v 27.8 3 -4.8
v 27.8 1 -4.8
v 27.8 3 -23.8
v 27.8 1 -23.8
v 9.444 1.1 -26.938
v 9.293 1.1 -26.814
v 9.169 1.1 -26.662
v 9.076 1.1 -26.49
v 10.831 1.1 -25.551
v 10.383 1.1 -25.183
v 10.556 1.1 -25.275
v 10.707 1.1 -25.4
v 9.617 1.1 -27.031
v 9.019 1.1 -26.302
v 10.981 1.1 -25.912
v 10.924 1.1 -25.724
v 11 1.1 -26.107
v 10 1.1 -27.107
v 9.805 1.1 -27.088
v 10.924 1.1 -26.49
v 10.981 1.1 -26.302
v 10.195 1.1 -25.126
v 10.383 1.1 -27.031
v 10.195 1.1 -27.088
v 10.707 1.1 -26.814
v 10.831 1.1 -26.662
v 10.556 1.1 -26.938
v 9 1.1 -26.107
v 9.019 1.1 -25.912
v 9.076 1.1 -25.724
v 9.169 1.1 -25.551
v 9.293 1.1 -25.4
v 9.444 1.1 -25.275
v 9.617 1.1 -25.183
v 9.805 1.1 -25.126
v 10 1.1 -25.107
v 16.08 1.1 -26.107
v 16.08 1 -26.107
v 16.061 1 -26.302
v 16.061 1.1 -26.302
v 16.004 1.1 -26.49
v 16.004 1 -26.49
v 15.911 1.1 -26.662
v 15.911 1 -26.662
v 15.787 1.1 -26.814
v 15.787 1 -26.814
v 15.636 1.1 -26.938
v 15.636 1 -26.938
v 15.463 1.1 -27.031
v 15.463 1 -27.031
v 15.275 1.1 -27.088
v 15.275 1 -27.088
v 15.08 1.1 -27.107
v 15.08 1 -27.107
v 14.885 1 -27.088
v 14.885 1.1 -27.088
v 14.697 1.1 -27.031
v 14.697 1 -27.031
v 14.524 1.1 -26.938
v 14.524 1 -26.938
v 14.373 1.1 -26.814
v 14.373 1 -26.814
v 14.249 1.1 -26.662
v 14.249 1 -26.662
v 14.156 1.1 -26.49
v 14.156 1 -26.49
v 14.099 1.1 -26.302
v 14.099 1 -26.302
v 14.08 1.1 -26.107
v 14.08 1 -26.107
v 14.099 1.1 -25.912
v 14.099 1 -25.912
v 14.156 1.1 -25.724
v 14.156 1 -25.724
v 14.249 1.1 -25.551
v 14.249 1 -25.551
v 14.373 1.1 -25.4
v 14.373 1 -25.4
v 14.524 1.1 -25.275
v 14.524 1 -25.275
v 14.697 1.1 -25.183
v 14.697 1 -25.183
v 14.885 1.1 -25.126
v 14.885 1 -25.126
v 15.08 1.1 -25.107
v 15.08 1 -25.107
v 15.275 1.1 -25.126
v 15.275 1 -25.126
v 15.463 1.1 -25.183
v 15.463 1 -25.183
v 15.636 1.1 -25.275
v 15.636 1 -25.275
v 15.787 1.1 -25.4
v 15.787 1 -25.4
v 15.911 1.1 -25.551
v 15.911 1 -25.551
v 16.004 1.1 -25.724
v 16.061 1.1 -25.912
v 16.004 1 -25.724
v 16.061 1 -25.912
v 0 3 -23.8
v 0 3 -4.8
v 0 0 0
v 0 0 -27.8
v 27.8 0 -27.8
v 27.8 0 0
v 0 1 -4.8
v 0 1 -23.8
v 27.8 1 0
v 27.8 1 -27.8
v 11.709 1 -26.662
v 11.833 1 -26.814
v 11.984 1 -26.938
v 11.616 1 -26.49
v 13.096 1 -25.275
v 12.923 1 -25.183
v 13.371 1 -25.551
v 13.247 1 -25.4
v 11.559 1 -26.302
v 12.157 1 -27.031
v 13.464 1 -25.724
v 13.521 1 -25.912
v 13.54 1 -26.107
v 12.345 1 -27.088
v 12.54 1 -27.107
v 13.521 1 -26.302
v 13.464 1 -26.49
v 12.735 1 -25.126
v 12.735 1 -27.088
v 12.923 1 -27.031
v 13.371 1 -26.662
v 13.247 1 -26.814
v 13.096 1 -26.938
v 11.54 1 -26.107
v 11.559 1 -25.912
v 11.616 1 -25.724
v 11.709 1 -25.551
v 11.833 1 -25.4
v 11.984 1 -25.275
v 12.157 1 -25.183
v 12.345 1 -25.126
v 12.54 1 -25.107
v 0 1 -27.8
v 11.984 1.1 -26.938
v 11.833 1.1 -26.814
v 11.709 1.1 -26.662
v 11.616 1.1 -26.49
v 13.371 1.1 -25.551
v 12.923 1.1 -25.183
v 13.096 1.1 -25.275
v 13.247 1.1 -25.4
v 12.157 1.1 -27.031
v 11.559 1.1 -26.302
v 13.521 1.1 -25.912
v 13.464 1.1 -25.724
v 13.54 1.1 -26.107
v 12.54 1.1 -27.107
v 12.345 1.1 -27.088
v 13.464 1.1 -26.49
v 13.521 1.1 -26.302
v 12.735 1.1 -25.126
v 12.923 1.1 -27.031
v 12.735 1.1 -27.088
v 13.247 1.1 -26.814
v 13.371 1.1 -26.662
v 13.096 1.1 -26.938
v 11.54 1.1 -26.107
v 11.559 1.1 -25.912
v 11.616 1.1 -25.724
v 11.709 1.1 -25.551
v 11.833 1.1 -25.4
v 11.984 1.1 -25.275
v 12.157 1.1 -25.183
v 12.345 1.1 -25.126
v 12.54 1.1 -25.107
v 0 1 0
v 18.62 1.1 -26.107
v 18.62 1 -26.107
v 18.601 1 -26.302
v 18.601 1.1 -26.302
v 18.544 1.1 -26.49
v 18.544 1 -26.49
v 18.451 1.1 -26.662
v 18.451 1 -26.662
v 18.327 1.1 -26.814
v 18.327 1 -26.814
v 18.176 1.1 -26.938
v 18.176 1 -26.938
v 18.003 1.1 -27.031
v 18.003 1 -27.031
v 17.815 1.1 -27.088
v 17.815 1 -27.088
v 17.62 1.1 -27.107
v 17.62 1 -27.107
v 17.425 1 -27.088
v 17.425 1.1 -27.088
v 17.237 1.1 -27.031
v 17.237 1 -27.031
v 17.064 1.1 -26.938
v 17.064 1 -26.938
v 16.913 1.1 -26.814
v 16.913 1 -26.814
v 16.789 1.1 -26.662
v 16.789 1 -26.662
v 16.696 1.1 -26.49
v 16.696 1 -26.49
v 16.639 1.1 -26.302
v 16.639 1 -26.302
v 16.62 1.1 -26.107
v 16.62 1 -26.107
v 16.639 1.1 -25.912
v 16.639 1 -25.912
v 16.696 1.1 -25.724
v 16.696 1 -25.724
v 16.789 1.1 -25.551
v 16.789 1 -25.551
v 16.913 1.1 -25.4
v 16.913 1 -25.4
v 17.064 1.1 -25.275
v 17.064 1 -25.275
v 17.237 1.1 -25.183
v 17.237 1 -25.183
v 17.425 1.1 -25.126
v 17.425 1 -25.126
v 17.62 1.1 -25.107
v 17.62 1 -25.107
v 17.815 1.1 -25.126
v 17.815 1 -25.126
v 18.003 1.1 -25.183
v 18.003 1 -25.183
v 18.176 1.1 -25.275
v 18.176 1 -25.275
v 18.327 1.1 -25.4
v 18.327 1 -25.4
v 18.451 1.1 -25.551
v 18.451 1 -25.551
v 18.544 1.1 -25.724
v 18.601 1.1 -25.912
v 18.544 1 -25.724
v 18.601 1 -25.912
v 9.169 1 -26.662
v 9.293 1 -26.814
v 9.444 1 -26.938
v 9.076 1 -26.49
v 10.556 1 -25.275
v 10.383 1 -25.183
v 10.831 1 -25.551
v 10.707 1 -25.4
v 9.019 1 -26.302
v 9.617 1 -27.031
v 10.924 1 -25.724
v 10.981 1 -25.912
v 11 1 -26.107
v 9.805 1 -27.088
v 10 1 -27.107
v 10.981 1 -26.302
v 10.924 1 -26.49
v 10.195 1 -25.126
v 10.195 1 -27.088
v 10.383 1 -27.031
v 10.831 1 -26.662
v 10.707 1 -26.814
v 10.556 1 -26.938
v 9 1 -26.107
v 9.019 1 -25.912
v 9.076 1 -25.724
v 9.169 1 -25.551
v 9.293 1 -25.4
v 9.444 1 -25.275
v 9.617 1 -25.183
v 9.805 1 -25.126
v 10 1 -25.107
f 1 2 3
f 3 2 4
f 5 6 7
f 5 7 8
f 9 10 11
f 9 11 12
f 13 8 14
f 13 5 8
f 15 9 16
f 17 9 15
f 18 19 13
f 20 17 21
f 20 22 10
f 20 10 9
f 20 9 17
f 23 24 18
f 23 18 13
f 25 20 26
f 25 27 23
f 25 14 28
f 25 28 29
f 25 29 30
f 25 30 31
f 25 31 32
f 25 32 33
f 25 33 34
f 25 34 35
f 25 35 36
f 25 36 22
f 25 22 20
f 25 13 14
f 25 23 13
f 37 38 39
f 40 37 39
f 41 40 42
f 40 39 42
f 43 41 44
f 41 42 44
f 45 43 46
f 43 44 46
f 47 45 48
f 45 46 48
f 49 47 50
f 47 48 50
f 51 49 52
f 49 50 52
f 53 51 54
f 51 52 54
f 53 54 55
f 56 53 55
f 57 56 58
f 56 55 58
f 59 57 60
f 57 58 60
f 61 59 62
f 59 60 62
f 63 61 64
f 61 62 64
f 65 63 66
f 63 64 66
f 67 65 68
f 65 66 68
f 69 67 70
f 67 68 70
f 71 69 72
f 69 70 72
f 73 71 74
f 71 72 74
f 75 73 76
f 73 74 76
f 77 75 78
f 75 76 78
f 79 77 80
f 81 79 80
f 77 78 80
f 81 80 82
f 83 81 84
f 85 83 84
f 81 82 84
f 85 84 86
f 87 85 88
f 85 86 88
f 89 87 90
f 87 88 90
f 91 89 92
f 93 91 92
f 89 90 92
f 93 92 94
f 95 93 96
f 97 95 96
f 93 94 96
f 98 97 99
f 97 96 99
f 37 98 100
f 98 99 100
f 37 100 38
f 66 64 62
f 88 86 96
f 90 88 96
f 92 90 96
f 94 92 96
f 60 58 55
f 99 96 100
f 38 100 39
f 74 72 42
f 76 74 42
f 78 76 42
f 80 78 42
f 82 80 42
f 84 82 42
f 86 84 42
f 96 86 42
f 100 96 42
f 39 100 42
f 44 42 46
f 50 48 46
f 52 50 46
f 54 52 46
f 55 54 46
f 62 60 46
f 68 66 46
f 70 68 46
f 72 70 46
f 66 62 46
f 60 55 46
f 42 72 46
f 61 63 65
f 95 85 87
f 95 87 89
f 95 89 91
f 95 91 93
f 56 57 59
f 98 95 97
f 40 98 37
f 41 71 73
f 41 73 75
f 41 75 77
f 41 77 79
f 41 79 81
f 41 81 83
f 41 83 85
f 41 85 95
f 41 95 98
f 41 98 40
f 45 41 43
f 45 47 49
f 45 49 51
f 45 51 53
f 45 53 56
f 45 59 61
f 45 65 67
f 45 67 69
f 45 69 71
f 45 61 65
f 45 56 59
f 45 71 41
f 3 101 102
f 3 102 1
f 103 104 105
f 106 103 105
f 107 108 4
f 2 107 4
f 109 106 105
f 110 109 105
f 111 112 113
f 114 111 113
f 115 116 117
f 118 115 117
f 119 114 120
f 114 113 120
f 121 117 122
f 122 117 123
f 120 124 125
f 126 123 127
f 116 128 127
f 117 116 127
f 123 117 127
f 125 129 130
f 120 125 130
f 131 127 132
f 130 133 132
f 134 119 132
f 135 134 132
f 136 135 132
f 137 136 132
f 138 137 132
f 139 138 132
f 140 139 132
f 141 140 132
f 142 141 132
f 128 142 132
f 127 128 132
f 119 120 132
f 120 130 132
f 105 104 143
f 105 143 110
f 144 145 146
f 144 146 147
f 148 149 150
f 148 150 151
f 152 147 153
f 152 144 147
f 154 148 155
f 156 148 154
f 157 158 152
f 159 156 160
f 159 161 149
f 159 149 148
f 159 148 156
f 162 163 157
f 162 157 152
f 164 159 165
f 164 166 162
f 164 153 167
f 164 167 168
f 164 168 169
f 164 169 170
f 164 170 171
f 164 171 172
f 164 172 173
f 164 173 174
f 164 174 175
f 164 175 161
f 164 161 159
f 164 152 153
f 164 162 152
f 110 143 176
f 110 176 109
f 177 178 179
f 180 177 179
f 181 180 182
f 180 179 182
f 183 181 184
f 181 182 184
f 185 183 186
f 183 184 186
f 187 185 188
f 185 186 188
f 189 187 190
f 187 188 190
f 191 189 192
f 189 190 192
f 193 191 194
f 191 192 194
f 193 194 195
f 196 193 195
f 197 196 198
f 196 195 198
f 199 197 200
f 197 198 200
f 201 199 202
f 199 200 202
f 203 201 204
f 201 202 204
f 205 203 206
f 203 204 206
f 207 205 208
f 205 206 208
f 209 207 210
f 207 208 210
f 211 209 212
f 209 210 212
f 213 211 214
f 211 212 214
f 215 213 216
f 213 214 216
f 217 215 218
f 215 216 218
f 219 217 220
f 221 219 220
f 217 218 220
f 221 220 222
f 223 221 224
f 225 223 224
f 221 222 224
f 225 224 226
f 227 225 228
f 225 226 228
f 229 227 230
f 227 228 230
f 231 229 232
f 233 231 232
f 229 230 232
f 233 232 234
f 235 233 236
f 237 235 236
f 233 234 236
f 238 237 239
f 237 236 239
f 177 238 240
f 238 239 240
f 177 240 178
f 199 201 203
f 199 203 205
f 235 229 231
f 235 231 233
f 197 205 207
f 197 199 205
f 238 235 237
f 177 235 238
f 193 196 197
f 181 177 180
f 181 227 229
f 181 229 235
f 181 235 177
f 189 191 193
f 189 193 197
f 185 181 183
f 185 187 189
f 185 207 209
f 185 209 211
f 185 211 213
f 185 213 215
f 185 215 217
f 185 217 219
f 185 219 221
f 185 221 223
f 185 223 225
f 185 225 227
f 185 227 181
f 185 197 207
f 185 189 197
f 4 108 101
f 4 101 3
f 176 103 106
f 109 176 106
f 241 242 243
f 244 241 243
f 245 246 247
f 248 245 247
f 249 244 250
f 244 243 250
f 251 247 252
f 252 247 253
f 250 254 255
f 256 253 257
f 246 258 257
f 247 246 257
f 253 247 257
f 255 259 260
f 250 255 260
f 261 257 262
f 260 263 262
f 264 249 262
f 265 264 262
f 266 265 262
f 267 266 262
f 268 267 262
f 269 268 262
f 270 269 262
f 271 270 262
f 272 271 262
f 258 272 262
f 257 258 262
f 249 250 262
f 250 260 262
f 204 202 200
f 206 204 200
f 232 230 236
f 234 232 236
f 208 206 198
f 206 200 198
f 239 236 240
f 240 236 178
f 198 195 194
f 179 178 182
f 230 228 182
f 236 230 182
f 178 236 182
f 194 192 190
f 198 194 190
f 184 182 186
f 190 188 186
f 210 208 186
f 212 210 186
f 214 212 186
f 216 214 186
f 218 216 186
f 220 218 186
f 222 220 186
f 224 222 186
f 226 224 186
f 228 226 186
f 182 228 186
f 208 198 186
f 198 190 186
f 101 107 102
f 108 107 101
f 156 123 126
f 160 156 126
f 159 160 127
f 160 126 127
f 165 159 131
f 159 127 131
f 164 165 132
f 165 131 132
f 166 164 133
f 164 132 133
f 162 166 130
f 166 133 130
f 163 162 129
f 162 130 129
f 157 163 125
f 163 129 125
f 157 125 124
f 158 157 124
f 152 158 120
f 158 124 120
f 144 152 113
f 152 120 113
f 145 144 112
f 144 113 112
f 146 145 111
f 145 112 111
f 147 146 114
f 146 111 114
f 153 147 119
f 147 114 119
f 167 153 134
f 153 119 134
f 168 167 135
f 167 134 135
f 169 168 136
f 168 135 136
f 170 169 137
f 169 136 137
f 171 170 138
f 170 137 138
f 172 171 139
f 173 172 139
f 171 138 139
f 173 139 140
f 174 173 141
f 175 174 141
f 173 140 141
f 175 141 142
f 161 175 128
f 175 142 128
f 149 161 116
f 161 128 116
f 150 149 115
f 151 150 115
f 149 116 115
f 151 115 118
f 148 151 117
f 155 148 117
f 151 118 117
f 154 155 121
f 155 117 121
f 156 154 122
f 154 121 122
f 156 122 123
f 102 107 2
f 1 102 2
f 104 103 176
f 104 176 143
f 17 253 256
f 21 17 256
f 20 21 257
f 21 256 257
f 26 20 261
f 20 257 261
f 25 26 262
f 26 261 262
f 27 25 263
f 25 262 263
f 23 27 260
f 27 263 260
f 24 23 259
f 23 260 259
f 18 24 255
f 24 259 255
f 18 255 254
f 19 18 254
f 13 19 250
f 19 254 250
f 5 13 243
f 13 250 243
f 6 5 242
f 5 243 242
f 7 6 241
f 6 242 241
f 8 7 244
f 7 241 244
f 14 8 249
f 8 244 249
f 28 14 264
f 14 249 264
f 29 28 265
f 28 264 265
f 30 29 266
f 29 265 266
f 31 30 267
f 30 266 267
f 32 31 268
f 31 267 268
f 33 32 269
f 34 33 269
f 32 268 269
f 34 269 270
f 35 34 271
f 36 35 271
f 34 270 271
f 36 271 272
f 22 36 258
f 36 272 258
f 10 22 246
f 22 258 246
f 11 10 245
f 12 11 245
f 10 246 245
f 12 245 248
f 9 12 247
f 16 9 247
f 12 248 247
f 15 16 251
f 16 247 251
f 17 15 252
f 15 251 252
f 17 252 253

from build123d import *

# Parameters (mm, degrees)
SKETCH1_W             = 27.8
SKETCH1_H             = 27.8
BOSS_EXTRUDE1_DEPTH   = 1
SKETCH2_W             = 27.8
SKETCH2_H             = 19
BOSS_EXTRUDE2_DEPTH   = 2
SKETCH3_R             = 1
BOSS_EXTRUDE3_DEPTH   = 0.1
BOSS_EXTRUDE3_2_DEPTH = 0.1
BOSS_EXTRUDE3_3_DEPTH = 0.1
BOSS_EXTRUDE3_4_DEPTH = 0.1


with BuildPart() as part:
    # Sketch1 → Boss-Extrude1 (new body)
    with BuildSketch(Plane(origin=(0, 0, 0), x_dir=(1, 0, 0), z_dir=(0, 1, 0))):
        with Locations((13.9, 13.9)):
            Rectangle(SKETCH1_W, SKETCH1_H)
    extrude(amount=BOSS_EXTRUDE1_DEPTH)


with BuildPart() as body_2:
    # Sketch2 → Boss-Extrude2 (new body)
    with BuildSketch(Plane(origin=(0, 1, 0), x_dir=(1, 0, 0), z_dir=(0, 1, 0))):
        with Locations((13.9, 14.3)):
            Rectangle(SKETCH2_W, SKETCH2_H)
    extrude(amount=BOSS_EXTRUDE2_DEPTH)


with BuildPart() as body_3:
    # Sketch3 → Boss-Extrude3 (new body)
    with BuildSketch(Plane(origin=(0, 1, 0), x_dir=(1, 0, 0), z_dir=(0, 1, 0))):
        with Locations((10, 26.10685226)):
            Circle(SKETCH3_R)
    extrude(amount=BOSS_EXTRUDE3_DEPTH)


with BuildPart() as body_4:
    # Sketch3 → Boss-Extrude3 2 (new body)
    with BuildSketch(Plane(origin=(0, 1, 0), x_dir=(1, 0, 0), z_dir=(0, 1, 0))):
        with Locations((12.54, 26.10685226)):
            Circle(SKETCH3_R)
    extrude(amount=BOSS_EXTRUDE3_2_DEPTH)


with BuildPart() as body_5:
    # Sketch3 → Boss-Extrude3 3 (new body)
    with BuildSketch(Plane(origin=(0, 1, 0), x_dir=(1, 0, 0), z_dir=(0, 1, 0))):
        with Locations((15.08, 26.10685226)):
            Circle(SKETCH3_R)
    extrude(amount=BOSS_EXTRUDE3_3_DEPTH)


with BuildPart() as body_6:
    # Sketch3 → Boss-Extrude3 4 (new body)
    with BuildSketch(Plane(origin=(0, 1, 0), x_dir=(1, 0, 0), z_dir=(0, 1, 0))):
        with Locations((17.62, 26.10685226)):
            Circle(SKETCH3_R)
    extrude(amount=BOSS_EXTRUDE3_4_DEPTH)


solid = Compound([part.part, body_2.part, body_3.part, body_4.part, body_5.part, body_6.part])
